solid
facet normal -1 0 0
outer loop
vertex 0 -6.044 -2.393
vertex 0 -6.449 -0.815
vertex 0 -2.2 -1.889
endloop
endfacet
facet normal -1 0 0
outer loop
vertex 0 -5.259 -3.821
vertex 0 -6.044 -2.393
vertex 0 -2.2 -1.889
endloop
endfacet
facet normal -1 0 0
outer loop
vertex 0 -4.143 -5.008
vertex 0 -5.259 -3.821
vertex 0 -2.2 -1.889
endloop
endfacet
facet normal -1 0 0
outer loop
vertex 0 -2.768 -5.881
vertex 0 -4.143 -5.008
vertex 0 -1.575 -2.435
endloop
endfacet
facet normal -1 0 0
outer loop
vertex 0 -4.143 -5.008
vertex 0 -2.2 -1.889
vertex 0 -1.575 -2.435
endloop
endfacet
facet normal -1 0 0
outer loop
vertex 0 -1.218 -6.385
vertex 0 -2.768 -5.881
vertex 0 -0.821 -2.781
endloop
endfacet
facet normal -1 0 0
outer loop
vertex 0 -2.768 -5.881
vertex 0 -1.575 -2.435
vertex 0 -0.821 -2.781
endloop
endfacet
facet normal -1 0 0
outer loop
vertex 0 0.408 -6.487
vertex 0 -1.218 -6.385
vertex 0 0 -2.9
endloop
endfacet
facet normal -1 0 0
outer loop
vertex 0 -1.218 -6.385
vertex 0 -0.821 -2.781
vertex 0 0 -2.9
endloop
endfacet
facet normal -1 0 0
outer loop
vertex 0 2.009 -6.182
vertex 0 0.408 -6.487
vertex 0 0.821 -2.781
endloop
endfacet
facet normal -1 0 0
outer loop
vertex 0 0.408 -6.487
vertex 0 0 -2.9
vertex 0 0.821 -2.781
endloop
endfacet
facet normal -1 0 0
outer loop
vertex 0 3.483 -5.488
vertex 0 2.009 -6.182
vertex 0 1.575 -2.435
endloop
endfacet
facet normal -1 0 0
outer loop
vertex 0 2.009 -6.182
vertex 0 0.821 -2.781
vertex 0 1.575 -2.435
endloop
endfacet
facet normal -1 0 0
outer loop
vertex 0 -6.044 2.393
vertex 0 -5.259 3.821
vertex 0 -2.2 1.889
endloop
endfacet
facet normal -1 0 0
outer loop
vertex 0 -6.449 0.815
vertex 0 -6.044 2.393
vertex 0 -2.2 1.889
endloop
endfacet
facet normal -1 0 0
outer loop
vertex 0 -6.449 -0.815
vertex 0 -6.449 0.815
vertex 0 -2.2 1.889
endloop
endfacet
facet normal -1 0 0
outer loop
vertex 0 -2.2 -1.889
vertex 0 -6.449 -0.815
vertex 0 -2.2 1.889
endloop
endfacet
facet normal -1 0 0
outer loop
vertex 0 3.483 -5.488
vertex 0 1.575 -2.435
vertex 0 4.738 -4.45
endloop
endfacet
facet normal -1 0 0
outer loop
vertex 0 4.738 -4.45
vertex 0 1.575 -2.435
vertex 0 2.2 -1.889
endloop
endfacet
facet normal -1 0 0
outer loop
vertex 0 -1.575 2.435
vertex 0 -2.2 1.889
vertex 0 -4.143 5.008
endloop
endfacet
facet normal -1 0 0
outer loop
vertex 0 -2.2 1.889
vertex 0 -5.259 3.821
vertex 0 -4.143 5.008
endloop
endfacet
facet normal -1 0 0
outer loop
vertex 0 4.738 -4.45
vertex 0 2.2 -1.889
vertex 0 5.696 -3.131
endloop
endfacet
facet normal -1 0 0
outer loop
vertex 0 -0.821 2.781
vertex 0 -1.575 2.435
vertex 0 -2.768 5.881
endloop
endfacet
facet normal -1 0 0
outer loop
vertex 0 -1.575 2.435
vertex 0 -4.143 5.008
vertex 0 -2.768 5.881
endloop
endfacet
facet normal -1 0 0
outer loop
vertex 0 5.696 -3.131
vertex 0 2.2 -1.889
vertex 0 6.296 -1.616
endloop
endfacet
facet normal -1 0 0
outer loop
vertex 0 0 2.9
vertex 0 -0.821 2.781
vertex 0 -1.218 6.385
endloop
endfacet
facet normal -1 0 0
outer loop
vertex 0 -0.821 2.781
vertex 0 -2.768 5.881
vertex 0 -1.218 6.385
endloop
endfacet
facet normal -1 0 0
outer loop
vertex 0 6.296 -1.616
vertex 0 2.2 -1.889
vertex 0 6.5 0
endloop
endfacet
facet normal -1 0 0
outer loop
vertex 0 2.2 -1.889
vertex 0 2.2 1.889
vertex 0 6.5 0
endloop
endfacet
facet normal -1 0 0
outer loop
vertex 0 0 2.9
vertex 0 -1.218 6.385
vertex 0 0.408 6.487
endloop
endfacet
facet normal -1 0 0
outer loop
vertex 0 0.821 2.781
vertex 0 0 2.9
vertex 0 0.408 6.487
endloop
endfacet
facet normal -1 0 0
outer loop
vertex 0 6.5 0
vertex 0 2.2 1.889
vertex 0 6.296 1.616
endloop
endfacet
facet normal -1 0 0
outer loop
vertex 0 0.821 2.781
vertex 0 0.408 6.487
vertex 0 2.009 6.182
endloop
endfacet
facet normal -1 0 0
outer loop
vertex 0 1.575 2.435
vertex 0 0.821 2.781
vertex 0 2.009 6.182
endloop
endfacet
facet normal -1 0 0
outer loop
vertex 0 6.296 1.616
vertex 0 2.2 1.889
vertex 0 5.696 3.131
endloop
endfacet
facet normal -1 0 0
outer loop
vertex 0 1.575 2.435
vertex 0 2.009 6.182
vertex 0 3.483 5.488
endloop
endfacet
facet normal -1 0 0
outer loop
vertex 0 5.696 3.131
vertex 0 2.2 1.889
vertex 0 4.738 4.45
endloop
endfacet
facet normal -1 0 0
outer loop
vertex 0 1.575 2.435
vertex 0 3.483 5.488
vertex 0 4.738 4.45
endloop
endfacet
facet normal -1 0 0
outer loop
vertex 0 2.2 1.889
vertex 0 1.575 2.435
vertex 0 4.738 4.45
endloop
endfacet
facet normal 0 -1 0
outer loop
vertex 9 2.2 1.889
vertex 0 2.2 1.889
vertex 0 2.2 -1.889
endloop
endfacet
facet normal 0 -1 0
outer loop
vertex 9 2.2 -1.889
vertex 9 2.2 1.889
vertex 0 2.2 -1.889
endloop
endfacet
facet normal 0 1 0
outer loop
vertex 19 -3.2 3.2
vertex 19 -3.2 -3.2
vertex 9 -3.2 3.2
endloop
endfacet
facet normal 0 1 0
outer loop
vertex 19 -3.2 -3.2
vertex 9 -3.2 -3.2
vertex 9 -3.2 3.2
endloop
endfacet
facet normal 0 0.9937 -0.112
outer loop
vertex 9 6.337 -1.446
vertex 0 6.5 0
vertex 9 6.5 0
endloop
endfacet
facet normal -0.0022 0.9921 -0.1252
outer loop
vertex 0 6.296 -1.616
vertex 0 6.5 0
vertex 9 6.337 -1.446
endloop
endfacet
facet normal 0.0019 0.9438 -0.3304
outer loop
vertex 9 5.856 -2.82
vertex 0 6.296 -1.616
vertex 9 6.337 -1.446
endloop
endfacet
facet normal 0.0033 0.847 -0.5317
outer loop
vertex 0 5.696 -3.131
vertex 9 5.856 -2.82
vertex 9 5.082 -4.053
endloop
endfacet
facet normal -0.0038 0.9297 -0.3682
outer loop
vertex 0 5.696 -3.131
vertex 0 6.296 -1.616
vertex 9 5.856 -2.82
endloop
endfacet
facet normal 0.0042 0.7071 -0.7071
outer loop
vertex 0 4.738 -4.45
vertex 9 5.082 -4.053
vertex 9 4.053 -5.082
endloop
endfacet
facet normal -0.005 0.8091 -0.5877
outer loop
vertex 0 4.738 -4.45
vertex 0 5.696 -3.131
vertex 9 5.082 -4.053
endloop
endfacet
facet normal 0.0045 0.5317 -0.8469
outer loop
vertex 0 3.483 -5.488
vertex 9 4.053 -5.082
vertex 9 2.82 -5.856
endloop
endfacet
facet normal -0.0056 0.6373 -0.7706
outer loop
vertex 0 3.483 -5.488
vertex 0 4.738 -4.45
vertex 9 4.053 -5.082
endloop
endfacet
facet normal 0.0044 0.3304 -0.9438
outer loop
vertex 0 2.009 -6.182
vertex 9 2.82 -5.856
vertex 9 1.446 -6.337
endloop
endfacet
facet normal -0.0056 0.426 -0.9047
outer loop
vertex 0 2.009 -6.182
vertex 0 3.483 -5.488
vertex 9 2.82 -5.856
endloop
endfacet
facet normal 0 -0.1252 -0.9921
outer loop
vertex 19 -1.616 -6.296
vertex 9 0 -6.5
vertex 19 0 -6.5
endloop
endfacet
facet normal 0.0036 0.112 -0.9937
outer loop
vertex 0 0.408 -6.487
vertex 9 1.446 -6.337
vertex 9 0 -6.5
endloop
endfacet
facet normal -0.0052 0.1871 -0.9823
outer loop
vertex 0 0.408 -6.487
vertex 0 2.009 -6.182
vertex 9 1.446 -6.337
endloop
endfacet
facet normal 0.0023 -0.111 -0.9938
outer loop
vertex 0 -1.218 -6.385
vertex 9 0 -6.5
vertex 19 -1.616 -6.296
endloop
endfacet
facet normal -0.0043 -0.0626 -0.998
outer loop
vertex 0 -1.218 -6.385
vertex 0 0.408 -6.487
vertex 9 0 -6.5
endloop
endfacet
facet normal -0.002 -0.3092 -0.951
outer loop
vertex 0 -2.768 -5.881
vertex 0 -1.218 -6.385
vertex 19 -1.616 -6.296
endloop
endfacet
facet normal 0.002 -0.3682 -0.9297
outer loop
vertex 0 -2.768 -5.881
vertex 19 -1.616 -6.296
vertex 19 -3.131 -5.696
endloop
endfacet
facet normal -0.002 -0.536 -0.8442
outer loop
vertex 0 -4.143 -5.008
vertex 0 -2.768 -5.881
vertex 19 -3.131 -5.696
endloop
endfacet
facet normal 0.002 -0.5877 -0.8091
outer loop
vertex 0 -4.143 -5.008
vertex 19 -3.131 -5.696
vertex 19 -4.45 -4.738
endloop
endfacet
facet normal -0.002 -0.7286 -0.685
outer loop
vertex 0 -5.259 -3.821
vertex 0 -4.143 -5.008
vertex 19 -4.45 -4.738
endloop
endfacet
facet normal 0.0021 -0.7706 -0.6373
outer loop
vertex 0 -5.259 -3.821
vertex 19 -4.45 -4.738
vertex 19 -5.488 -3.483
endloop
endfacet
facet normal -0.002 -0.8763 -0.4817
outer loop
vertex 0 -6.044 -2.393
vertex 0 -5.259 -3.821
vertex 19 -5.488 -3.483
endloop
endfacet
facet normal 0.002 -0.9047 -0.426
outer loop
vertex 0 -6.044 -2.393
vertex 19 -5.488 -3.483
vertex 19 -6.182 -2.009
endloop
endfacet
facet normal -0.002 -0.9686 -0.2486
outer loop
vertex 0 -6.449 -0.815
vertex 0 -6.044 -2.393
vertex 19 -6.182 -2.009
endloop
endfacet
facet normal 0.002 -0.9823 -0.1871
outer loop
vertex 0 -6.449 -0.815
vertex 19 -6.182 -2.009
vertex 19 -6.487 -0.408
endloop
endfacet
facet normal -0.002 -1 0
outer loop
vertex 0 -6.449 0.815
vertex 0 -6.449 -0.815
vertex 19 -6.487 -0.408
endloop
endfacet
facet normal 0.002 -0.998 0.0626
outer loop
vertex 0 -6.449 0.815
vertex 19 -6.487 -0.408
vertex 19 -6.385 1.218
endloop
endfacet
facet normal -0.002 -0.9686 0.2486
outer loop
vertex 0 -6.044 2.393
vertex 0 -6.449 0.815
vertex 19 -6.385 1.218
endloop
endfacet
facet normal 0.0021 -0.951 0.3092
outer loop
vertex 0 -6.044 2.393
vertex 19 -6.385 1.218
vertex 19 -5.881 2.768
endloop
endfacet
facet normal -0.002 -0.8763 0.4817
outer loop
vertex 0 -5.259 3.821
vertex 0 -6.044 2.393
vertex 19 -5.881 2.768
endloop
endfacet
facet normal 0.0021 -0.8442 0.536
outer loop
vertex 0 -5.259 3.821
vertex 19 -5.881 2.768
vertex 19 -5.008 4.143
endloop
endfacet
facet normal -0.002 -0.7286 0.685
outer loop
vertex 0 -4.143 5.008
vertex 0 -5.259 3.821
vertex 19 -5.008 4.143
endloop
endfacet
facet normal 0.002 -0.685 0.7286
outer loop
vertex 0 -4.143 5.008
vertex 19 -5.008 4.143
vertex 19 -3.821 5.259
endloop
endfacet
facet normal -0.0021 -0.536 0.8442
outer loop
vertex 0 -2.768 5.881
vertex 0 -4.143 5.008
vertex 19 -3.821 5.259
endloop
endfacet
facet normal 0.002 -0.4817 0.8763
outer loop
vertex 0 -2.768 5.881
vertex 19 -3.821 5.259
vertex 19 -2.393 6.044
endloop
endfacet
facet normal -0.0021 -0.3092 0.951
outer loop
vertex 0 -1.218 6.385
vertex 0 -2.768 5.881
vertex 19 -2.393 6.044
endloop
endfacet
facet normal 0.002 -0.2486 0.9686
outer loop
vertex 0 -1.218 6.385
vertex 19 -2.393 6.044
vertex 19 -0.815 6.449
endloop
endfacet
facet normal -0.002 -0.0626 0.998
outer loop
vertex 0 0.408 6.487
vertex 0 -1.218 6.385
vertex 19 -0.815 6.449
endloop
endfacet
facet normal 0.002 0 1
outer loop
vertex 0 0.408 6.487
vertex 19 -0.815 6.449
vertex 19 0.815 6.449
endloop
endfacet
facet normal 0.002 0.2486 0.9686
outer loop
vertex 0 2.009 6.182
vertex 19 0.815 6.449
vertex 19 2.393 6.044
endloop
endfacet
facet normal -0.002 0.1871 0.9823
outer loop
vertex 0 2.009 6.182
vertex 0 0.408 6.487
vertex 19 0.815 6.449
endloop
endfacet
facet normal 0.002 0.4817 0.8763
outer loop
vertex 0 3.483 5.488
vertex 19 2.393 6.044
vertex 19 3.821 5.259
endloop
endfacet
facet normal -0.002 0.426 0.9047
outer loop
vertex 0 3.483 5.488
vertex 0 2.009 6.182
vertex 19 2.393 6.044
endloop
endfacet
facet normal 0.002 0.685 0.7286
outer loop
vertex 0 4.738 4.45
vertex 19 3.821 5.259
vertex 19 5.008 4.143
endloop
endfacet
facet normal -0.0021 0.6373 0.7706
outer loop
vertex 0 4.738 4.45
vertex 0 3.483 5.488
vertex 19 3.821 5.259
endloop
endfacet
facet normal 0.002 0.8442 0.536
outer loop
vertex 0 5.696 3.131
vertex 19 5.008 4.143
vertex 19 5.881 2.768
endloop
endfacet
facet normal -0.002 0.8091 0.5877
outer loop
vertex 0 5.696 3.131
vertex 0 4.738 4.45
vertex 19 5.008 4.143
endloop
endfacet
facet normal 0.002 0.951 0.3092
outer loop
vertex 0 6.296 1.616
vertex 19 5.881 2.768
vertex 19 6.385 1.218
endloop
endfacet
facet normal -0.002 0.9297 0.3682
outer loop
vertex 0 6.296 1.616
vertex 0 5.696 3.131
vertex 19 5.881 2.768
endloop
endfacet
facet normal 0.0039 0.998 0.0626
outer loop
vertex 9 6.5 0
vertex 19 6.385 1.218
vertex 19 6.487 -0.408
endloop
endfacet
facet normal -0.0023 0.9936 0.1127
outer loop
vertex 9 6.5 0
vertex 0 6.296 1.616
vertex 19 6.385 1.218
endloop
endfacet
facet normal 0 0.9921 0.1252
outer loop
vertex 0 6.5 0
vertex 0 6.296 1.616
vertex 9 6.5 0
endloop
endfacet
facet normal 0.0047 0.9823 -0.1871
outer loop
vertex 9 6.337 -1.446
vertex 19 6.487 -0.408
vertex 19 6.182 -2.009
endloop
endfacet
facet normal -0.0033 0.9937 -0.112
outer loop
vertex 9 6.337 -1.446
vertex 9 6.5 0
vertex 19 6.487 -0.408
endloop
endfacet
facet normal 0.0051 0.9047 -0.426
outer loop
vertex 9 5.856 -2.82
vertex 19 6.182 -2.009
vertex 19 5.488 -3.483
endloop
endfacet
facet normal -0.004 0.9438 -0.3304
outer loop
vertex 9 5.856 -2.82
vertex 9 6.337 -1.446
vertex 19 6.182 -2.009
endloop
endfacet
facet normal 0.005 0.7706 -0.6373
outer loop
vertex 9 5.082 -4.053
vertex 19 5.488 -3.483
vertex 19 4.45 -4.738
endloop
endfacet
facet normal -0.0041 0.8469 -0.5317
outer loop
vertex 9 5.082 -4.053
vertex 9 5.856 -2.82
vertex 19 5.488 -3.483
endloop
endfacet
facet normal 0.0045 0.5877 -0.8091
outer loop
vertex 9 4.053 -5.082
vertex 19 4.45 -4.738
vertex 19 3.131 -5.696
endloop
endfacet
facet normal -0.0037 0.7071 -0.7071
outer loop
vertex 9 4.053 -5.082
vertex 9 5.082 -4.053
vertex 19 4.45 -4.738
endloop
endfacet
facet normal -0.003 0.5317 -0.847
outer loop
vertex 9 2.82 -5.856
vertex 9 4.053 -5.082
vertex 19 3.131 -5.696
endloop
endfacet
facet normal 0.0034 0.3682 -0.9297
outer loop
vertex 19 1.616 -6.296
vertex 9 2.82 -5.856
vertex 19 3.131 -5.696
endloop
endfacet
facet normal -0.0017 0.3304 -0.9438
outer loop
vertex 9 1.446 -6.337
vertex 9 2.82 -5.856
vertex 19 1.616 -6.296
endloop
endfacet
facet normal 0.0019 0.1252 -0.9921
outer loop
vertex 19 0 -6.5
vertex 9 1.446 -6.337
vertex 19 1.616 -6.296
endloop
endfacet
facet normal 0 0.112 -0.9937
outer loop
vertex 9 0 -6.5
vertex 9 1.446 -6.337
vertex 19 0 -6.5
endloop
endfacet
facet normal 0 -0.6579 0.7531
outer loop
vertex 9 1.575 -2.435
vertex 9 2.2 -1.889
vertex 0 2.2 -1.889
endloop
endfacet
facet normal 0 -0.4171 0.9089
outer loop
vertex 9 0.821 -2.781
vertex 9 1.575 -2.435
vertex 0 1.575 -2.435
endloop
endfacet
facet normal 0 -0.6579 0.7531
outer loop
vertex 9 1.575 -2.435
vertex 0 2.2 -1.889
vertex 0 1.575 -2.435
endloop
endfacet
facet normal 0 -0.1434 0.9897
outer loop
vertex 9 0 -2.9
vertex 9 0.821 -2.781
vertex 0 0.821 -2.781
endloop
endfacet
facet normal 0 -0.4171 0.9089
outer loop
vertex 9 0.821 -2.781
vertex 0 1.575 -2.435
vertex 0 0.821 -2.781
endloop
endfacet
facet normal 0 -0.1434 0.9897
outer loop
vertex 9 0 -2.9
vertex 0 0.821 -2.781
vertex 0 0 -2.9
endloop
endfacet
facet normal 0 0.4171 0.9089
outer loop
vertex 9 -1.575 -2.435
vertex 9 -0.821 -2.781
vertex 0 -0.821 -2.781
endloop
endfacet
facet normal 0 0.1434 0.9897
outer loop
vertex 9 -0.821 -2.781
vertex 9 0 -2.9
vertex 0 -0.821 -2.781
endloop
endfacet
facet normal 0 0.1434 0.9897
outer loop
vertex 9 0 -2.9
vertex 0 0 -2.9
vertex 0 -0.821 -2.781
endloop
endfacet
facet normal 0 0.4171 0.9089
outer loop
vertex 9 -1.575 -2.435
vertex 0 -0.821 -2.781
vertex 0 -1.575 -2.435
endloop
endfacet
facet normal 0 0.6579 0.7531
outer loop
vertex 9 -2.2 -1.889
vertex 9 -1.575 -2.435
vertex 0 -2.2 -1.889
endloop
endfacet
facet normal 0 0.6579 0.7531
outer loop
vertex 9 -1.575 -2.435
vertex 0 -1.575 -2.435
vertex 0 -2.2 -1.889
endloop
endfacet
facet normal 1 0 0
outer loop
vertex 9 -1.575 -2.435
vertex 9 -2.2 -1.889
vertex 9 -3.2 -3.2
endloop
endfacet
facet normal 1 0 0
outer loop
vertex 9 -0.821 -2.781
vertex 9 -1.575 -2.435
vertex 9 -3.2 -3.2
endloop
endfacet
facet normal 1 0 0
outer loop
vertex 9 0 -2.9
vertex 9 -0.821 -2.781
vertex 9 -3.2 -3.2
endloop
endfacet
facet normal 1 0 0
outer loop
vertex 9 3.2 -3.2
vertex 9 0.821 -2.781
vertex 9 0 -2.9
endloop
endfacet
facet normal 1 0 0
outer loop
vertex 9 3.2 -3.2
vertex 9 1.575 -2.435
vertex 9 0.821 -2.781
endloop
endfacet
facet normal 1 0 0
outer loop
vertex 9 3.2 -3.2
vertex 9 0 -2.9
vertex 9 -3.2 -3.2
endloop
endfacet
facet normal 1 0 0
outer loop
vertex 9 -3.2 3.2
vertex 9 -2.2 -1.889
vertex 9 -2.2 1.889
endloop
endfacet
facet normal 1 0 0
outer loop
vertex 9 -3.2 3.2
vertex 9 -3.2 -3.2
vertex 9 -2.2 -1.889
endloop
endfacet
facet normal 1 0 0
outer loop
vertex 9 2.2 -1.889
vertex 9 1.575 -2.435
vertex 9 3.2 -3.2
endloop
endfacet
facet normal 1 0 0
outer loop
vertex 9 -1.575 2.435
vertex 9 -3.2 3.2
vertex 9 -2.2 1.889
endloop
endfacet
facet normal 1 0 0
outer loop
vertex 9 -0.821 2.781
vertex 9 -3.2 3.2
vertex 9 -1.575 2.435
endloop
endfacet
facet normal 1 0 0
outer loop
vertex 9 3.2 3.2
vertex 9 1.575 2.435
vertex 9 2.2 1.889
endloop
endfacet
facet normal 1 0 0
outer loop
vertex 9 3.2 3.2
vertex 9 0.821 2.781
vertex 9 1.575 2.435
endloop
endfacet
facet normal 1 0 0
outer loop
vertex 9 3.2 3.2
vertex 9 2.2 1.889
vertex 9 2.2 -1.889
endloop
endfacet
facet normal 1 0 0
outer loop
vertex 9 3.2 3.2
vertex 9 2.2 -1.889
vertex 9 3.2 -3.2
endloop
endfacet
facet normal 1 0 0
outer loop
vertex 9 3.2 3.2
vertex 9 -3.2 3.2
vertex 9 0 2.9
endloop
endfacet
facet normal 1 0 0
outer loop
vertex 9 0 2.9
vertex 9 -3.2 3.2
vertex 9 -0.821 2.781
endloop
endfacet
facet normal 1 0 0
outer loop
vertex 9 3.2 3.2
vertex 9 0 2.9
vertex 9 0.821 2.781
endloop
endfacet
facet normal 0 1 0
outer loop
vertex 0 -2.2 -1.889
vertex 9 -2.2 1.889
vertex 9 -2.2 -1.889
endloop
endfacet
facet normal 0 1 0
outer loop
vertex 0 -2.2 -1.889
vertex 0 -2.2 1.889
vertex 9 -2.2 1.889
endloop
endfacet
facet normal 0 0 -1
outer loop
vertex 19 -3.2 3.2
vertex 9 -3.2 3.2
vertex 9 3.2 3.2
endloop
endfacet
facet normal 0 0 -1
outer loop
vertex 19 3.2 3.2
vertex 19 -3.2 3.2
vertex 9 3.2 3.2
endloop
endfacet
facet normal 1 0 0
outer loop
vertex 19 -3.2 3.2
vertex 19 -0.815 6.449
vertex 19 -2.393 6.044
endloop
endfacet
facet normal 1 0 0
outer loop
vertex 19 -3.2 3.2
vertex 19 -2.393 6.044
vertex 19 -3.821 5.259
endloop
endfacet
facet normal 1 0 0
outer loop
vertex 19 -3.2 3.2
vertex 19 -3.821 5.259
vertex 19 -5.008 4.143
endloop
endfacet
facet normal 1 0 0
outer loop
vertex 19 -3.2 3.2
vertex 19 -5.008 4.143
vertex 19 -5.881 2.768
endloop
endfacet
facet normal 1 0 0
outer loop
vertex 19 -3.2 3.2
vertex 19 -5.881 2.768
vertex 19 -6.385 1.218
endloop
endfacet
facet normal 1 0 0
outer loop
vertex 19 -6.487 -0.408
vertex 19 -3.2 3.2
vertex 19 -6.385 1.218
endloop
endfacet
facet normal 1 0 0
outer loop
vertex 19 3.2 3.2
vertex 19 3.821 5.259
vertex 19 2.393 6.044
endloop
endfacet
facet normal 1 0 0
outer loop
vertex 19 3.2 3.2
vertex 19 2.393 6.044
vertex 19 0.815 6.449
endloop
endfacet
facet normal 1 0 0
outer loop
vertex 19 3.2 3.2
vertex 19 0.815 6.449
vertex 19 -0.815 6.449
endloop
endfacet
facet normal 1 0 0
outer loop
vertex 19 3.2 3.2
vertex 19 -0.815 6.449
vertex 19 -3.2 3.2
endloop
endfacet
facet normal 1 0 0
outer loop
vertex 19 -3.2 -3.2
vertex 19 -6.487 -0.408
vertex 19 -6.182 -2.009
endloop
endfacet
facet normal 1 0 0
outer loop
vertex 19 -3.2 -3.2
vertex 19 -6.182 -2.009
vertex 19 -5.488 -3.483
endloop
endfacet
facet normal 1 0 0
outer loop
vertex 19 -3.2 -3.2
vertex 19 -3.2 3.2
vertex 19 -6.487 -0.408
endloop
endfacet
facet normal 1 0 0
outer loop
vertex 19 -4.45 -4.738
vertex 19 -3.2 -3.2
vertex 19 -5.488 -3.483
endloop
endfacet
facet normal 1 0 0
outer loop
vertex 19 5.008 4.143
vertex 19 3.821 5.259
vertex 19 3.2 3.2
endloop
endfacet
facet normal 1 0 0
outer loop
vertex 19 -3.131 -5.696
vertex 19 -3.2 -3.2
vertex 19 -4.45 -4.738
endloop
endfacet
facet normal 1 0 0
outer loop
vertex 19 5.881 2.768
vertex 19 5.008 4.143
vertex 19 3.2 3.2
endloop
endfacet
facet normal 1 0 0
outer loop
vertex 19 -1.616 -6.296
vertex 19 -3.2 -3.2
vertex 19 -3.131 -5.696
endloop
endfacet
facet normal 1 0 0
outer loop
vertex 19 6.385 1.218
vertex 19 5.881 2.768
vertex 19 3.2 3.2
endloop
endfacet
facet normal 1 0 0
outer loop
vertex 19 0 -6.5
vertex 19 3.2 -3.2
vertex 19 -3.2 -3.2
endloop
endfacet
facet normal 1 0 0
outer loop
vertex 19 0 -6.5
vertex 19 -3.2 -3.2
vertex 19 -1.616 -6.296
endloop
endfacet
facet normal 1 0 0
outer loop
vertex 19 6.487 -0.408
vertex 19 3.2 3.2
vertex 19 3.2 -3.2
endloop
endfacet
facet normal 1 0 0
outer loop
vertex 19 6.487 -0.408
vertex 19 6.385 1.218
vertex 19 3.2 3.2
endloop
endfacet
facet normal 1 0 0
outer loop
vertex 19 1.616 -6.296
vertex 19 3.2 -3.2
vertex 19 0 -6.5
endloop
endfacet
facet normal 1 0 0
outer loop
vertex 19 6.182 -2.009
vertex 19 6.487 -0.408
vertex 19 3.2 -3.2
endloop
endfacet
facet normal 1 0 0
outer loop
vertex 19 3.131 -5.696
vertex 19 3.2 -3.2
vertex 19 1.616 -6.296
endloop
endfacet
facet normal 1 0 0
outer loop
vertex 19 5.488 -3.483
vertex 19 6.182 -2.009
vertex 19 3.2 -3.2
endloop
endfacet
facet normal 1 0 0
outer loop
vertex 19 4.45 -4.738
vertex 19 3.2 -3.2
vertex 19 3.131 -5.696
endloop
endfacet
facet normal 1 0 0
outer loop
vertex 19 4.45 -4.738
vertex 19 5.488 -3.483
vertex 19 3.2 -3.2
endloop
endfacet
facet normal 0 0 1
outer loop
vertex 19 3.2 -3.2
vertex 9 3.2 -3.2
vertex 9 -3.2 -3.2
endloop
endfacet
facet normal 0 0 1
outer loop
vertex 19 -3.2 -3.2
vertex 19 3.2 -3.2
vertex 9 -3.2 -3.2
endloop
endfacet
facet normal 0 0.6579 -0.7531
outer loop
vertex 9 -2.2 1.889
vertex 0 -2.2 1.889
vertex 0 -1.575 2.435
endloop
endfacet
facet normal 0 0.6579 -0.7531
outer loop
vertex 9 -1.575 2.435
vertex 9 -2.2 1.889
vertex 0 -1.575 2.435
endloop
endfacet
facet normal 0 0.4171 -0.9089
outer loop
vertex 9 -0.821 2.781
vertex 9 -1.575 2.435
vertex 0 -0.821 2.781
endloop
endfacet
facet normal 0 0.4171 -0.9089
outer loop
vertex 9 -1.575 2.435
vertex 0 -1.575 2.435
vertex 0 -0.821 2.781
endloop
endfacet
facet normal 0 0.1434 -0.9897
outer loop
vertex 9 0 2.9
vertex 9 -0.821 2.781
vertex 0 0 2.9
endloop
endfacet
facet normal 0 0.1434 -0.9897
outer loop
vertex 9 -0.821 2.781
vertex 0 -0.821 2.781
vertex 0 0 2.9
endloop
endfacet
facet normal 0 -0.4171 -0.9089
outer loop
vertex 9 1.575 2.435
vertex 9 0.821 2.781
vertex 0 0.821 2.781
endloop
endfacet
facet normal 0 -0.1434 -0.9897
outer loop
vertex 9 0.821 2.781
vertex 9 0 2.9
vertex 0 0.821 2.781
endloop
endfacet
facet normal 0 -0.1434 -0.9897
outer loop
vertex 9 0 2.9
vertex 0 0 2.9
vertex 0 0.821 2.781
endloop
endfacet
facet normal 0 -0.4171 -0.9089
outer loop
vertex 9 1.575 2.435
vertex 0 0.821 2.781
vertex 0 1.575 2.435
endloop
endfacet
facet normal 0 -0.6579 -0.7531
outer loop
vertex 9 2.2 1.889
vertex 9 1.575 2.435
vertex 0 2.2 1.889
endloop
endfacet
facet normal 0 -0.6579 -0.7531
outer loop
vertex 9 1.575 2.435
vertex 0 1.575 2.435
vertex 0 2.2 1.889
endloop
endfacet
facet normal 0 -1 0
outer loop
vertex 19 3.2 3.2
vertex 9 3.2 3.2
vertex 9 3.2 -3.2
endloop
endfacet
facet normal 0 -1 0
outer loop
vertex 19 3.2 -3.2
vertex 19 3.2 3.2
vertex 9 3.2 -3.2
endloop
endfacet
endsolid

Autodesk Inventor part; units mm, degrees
ref_plane "YZ Plane" through (0, 0, 0) normal (1, 0, 0) x (0, 1, 0)
ref_plane "XZ Plane" through (0, 0, 0) normal (0, 1, 0) x (-1, 0, 0)
ref_plane "XY Plane" through (0, 0, 0) normal (0, 0, 1) x (1, 0, 0)
sketch "Boceto1" plane through (0, 0, 0) normal (1, 0, 0) x (0, 1, 0)
  circle A0 centre (0, 0) radius 2.9
  line L0 (2.2, 1.8894) -> (2.2, -1.8894)
  line L1 (-2.2, 1.8894) -> (-2.2, -1.8894)
  circle A1 centre (0, 0) radius 6.5
  dimension "d0" = 5.8
  dimension "d1" = 2.2
  dimension "d2" = 2.2
  dimension "d3" = 13
extrude "Extrusión1" add sketch "Boceto1" along normal blind 9 contours A0 L0 | L1 A0 | A1
sketch "Boceto2" plane through (9, 0, 0) normal (1, 0, 0) x (0, 0, -1)
  circle A0 centre (0, 0) radius 6.5
  line L0 (3.2, -3.2) -> (-3.2, -3.2)
  line L1 (-3.2, -3.2) -> (-3.2, 3.2)
  line L2 (-3.2, 3.2) -> (3.2, 3.2)
  line L3 (3.2, 3.2) -> (3.2, -3.2)
  line L4 (3.2, -3.2) -> (-3.2, 3.2) construction
  line L5 (-3.2, -3.2) -> (3.2, 3.2) construction
  dimension "d6" = 6.4
  dimension "d7" = 6.4
extrude "Extrusión2" add sketch "Boceto2" along normal blind 10
properties part number "Adaptador"
